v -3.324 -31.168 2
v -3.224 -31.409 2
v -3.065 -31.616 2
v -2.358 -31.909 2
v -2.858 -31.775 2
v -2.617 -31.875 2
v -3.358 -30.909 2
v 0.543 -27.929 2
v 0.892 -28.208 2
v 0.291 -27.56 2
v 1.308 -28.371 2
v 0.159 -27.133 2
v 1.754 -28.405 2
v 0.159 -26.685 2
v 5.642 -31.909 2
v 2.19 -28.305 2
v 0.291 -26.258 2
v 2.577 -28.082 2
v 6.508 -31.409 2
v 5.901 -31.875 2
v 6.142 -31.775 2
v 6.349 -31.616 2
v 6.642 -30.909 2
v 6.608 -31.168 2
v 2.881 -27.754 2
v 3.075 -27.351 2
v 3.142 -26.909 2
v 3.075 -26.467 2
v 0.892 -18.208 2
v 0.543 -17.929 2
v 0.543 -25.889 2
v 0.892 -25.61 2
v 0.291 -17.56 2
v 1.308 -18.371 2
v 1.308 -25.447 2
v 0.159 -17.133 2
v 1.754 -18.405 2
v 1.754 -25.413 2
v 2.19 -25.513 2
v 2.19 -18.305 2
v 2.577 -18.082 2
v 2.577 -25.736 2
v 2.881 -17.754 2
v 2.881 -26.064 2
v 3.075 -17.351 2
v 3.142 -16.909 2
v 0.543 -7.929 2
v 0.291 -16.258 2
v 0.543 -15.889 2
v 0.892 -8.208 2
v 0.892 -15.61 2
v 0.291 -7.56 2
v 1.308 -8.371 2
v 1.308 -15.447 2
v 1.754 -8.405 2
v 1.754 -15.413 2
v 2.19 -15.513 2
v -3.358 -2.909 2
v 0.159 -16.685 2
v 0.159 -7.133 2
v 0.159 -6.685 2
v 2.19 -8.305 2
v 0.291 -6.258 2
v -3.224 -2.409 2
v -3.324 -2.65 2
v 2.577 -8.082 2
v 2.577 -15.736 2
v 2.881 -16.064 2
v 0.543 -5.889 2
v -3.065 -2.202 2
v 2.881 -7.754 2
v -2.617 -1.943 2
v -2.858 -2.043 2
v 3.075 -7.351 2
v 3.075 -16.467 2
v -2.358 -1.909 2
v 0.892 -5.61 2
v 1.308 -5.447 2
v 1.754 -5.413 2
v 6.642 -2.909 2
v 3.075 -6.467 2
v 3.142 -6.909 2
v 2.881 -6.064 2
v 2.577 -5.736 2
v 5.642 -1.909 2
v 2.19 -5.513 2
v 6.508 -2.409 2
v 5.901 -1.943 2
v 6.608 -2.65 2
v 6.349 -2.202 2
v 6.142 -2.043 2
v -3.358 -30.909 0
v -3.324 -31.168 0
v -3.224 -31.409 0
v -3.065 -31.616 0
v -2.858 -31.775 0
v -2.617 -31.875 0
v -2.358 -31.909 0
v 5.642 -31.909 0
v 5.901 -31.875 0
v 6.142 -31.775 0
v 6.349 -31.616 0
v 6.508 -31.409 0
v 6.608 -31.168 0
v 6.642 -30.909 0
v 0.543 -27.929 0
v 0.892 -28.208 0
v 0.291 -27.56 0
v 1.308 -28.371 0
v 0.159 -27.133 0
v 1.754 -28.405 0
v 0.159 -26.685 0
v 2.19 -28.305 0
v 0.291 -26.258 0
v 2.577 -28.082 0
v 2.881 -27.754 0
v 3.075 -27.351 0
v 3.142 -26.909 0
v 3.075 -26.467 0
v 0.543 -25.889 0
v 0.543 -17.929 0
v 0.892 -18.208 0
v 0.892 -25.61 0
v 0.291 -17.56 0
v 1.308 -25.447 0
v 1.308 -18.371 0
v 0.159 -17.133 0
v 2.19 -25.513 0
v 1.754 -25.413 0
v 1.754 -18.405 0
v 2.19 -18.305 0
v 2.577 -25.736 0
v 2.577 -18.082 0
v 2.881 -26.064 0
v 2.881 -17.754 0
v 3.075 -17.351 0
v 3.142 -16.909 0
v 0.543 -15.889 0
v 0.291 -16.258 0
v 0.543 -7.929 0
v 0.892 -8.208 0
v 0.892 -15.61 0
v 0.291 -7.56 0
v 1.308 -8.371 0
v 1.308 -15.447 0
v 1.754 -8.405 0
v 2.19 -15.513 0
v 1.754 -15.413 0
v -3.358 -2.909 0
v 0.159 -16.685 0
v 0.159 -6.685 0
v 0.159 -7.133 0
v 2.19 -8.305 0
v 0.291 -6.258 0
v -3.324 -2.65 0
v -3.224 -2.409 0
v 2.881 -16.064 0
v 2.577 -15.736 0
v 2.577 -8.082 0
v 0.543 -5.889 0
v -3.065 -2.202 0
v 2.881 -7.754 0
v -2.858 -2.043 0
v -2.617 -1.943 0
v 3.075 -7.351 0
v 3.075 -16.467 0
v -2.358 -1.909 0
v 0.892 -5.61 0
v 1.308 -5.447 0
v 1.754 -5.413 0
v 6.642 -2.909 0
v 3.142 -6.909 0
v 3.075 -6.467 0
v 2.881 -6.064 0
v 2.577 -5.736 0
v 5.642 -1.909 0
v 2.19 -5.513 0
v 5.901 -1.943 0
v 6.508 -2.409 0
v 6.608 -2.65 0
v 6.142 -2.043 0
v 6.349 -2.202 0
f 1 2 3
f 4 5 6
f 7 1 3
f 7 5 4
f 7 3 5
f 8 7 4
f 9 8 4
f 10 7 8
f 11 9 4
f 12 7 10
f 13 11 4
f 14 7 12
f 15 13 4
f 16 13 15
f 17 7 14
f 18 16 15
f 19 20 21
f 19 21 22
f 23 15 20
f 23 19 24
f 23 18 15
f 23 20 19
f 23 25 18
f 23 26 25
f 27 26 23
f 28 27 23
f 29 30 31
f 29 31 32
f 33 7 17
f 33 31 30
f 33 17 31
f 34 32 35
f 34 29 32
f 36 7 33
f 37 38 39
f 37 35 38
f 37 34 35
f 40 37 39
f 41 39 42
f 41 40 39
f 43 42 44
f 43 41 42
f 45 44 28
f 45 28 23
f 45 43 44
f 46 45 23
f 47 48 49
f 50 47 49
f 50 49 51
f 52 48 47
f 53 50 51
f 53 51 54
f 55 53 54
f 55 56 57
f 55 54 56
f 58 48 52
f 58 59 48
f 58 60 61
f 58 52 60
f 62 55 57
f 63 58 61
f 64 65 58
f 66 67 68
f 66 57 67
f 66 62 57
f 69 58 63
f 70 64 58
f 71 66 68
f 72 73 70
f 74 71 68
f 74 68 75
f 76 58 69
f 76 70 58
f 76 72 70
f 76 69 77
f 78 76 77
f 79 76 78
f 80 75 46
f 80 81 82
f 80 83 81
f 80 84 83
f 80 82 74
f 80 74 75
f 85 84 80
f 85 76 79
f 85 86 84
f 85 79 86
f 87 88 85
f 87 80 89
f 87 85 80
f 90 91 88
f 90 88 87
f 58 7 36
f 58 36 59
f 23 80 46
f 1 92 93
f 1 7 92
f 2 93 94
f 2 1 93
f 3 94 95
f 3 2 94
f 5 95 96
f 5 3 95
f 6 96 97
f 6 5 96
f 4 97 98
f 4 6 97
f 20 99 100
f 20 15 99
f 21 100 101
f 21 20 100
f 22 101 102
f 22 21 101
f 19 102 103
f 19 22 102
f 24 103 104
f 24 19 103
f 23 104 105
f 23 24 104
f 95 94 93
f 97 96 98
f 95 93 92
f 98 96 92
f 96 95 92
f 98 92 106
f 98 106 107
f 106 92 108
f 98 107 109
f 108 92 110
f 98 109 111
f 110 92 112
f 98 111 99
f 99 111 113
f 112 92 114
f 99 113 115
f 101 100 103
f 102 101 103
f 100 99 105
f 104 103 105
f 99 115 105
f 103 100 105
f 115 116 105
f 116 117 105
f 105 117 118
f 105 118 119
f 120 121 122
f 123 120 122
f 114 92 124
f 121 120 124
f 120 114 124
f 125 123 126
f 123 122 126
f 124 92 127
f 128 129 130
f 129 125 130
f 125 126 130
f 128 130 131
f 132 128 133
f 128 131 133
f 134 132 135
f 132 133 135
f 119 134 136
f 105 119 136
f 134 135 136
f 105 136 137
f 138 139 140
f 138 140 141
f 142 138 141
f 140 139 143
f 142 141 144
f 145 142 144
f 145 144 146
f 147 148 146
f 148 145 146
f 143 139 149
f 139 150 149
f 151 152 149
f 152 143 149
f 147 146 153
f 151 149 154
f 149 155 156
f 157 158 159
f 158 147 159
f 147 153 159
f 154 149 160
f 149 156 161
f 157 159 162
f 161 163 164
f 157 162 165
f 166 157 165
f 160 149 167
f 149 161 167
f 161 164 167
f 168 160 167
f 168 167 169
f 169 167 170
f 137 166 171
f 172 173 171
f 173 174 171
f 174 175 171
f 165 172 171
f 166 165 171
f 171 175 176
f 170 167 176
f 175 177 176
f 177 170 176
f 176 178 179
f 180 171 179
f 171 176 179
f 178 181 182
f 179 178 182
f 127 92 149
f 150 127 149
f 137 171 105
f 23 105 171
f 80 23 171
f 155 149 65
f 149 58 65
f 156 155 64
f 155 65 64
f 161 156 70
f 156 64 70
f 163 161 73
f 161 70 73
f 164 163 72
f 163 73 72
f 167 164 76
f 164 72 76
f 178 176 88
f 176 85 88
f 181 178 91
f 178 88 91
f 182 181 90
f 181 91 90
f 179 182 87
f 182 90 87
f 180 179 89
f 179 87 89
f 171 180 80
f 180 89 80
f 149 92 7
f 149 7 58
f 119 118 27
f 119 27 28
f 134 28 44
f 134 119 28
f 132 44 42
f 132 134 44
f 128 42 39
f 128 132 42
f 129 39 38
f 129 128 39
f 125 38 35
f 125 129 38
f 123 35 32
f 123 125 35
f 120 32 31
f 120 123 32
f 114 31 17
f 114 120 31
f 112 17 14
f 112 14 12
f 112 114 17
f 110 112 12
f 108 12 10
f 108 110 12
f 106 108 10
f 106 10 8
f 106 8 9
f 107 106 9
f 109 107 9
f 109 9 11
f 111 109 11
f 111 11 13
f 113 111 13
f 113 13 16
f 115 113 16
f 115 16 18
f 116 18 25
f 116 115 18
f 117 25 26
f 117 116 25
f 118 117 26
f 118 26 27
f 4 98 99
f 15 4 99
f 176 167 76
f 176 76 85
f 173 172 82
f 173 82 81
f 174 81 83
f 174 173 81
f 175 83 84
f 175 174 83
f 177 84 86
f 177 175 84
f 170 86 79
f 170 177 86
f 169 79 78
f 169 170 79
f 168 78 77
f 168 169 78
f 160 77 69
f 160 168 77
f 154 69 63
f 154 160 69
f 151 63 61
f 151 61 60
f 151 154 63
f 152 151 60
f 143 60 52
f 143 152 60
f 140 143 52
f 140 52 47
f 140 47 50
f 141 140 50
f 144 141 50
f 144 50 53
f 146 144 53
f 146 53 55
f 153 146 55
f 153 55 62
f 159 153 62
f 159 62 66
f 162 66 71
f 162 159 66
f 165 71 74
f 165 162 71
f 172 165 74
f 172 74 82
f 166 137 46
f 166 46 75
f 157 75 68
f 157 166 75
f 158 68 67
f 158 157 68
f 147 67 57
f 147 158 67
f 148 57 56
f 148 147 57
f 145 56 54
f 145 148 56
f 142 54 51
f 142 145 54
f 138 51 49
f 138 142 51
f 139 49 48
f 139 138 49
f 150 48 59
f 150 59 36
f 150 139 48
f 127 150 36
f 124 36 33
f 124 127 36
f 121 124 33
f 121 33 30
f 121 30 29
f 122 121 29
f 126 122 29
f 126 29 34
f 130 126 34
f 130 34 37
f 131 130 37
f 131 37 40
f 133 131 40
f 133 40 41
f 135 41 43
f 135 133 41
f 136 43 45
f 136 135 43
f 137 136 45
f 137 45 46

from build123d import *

# Parameters (mm, degrees)
SKETCH_1_W      = 10
SKETCH_1_H      = 30
SKETCH_1_R      = 1.5
EXTRUDE_1_DEPTH = 2
FILLET_1_R      = 1


with BuildPart() as part:
    # 草图1 → 凸台-拉伸1 (new body)
    with BuildSketch(Plane.XY):
        with Locations((1.642083631, -16.90903272)):
            Rectangle(SKETCH_1_W, SKETCH_1_H)
        with Locations((1.642083631, -6.90903272)):
            Circle(SKETCH_1_R, mode=Mode.SUBTRACT)
        with Locations((1.642083631, -16.90903272)):
            Circle(SKETCH_1_R, mode=Mode.SUBTRACT)
        with Locations((1.642083631, -26.90903272)):
            Circle(SKETCH_1_R, mode=Mode.SUBTRACT)
    extrude(amount=EXTRUDE_1_DEPTH)

    # 圆角1
    fillet_1_edges = [part.edges().sort_by_distance(p)[0] for p in [
        (-3.357916369, -1.90903272, 1),
        (6.642083631, -1.90903272, 1),
        (6.642083631, -31.90903272, 1),
        (-3.357916369, -31.90903272, 1),
    ]]
    fillet(fillet_1_edges, radius=FILLET_1_R)


solid = part.part
